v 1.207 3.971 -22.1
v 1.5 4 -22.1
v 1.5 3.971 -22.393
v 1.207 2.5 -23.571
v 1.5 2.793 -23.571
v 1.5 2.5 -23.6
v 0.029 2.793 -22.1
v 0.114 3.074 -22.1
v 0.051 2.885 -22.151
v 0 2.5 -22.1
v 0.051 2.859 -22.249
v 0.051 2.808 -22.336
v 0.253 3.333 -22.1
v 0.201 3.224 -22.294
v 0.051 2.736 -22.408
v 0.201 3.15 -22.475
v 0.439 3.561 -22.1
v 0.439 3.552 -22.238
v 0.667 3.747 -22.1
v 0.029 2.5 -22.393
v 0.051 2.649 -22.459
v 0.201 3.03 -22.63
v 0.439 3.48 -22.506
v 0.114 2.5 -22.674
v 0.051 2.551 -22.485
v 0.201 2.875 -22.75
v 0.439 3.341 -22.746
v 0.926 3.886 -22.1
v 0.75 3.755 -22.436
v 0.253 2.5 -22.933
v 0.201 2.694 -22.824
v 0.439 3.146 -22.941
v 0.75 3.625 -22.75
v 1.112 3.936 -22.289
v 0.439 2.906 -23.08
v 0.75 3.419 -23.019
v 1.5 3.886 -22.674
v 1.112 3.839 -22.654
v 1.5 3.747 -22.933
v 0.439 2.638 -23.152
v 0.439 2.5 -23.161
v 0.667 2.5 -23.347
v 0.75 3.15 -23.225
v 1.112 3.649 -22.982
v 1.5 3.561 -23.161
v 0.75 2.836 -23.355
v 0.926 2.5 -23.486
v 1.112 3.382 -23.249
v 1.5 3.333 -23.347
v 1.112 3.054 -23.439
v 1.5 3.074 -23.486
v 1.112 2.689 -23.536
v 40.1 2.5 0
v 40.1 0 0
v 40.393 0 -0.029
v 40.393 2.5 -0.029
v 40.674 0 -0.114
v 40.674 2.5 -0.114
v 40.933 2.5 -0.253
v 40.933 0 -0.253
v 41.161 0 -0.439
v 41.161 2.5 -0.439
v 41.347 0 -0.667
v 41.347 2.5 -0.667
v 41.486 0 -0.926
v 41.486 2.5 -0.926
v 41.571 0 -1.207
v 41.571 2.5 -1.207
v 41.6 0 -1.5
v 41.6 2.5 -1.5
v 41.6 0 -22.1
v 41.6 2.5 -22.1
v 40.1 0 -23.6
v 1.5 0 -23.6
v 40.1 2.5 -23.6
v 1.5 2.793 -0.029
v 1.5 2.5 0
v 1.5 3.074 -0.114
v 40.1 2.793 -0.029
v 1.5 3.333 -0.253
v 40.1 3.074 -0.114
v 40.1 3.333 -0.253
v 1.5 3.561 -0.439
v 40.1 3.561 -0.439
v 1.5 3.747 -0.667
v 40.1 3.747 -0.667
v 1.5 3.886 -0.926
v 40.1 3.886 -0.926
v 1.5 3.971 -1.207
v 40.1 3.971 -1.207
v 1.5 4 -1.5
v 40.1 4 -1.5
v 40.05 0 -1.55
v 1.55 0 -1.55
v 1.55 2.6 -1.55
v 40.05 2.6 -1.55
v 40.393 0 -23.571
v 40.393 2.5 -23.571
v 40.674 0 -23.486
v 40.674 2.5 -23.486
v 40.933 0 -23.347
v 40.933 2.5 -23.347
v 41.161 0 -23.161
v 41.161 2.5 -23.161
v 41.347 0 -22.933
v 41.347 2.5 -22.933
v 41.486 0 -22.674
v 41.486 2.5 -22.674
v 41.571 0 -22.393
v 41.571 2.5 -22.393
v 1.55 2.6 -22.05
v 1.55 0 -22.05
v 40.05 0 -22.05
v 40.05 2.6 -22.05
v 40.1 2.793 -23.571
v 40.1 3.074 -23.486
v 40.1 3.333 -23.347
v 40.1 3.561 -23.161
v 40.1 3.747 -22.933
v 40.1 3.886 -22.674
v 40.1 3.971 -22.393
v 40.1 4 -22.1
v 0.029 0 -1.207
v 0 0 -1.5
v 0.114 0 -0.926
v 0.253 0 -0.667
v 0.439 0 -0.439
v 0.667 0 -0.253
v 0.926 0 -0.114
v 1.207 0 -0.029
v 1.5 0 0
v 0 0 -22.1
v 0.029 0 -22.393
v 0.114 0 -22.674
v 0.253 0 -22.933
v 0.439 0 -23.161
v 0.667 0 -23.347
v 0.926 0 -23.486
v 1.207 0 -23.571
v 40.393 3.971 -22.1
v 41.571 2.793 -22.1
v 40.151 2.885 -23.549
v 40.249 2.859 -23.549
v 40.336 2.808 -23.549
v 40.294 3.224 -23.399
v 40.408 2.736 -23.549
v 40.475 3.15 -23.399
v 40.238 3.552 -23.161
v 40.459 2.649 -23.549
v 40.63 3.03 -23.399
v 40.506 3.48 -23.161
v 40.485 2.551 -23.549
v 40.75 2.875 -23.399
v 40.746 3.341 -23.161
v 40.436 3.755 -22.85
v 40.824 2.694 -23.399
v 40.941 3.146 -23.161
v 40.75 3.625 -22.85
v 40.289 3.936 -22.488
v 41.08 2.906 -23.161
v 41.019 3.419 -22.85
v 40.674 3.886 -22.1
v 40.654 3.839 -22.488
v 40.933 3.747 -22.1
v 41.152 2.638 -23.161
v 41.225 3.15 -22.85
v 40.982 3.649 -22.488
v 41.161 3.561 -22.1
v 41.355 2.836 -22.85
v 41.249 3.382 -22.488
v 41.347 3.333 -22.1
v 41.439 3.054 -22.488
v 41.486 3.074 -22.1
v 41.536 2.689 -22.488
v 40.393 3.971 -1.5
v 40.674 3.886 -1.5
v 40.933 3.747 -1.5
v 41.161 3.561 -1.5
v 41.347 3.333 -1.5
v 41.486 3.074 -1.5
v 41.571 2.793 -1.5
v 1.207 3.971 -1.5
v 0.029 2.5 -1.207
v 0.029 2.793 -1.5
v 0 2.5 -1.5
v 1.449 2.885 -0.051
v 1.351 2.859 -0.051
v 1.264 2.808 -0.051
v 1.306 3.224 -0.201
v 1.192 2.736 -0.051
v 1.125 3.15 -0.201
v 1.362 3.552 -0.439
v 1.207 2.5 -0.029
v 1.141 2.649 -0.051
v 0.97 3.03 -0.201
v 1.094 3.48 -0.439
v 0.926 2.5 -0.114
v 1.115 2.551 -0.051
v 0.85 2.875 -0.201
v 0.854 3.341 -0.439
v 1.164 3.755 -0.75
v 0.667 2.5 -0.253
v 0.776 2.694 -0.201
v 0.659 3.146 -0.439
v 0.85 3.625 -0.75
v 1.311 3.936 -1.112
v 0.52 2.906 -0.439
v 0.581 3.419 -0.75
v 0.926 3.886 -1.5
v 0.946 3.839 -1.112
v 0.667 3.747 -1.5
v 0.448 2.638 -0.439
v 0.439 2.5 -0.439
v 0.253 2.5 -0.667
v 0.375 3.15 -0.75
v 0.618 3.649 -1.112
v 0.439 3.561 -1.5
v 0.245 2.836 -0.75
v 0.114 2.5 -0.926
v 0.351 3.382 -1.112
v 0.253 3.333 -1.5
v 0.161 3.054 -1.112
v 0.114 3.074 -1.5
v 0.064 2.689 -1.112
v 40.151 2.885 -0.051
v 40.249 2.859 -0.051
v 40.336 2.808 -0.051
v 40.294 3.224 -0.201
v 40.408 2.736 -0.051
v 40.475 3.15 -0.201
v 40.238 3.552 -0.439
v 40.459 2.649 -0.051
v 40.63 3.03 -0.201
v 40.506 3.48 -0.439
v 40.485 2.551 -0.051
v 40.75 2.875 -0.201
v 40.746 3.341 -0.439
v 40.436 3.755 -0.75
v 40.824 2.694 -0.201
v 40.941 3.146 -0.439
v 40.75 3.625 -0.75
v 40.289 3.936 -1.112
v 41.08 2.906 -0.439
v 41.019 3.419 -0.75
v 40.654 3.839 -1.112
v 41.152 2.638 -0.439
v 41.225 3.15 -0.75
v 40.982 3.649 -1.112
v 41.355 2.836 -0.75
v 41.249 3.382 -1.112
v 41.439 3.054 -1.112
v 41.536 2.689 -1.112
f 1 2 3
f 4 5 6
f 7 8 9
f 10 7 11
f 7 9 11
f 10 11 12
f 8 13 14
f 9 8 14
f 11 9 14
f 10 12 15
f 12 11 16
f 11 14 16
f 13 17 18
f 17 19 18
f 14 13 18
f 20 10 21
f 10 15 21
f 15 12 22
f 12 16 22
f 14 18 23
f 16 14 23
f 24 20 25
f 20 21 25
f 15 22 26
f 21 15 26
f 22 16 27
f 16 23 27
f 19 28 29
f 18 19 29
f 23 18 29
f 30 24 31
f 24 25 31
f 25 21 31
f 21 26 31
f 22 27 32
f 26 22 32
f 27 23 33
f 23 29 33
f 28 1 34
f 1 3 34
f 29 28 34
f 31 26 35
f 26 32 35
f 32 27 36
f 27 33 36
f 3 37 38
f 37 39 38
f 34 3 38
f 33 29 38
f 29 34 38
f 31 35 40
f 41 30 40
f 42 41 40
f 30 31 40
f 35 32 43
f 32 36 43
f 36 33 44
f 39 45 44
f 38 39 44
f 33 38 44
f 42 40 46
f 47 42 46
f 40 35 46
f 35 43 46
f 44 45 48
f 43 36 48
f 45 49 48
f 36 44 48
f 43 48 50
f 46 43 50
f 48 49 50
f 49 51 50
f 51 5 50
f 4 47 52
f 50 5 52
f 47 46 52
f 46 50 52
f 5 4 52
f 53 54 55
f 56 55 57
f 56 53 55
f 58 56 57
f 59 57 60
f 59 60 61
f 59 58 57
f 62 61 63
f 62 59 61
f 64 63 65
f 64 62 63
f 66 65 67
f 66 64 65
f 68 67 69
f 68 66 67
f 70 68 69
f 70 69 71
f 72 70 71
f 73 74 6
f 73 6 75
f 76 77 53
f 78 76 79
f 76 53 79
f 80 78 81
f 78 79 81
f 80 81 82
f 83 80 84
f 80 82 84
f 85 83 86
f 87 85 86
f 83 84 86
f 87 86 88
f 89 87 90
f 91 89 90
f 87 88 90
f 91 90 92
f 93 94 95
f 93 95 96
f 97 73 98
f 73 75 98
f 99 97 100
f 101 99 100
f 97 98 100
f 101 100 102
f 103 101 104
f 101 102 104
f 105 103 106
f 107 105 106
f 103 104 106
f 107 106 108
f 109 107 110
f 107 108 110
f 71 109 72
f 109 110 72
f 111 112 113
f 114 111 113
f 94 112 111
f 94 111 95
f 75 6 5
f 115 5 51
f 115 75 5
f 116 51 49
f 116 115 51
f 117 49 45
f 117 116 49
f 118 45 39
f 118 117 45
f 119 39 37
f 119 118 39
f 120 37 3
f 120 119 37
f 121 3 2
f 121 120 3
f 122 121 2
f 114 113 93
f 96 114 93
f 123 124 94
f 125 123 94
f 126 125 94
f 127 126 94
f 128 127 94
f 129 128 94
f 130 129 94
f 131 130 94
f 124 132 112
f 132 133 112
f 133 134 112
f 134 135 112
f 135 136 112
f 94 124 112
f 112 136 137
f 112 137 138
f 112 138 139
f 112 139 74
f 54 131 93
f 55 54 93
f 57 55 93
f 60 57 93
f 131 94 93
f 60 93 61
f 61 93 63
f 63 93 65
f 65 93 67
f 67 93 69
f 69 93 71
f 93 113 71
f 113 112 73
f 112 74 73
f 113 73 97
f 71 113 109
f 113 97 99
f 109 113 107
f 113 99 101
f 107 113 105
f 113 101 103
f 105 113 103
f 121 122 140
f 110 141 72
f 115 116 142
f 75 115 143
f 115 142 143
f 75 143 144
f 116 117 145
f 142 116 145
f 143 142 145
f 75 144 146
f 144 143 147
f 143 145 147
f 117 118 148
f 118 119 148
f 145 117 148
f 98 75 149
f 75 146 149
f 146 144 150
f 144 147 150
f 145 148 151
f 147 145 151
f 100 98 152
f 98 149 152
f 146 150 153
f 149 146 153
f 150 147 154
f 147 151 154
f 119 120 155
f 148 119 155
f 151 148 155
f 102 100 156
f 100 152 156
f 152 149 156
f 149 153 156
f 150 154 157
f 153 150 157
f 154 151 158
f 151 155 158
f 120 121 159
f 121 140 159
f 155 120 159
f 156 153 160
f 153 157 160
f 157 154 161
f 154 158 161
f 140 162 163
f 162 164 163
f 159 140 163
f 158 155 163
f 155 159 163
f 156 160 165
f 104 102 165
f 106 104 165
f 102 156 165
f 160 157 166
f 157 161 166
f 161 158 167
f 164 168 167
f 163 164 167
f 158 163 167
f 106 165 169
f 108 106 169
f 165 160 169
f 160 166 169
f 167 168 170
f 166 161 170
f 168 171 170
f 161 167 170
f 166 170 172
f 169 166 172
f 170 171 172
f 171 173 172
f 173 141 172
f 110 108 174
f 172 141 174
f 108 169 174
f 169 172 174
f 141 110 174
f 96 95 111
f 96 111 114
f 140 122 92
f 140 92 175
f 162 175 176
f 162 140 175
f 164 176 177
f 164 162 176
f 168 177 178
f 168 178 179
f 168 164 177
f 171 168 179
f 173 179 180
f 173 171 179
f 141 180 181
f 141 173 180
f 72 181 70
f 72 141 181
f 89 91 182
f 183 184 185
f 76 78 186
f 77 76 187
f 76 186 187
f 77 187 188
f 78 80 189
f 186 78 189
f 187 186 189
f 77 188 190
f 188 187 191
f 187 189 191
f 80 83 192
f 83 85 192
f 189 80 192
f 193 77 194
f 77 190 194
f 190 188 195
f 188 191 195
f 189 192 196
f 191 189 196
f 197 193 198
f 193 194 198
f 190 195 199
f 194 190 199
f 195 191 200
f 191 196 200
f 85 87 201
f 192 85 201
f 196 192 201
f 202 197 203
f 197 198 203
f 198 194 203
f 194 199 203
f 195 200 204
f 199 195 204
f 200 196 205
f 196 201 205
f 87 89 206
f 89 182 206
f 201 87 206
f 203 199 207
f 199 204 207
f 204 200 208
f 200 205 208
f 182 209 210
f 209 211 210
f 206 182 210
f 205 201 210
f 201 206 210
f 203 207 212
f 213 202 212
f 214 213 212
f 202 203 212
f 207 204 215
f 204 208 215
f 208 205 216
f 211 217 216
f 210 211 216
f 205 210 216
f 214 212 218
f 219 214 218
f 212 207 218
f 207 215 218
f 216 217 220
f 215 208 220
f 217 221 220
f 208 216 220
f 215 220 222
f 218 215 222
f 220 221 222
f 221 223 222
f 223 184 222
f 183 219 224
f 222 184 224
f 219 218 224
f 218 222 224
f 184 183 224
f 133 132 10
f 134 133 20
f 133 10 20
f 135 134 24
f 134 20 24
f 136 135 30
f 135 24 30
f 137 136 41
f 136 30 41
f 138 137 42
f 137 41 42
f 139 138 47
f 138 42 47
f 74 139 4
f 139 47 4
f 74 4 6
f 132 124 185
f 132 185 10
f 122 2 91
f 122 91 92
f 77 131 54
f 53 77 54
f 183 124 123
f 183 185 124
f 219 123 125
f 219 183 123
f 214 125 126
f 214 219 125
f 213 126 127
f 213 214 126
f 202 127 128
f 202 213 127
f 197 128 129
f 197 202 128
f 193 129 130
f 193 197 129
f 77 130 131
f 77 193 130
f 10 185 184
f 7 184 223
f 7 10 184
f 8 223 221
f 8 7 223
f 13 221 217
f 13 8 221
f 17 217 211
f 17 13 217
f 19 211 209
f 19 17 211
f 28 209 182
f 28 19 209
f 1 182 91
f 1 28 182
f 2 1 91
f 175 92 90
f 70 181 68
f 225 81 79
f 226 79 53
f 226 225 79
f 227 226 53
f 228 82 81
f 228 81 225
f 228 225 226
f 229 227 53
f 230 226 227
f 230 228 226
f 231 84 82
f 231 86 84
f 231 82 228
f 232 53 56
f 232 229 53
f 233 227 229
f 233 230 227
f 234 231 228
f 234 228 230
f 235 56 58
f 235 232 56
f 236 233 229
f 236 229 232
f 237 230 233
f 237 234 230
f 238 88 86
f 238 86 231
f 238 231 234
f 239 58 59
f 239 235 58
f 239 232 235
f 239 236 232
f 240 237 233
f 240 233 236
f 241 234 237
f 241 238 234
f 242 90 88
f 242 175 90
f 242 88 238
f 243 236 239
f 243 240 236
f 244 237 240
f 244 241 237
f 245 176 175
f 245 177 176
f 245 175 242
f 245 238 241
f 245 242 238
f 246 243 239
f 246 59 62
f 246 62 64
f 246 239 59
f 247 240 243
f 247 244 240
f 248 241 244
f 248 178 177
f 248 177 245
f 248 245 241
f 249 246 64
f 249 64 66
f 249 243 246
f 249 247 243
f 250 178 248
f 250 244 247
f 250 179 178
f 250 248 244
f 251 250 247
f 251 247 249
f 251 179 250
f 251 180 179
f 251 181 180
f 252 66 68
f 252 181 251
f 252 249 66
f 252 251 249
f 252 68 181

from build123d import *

# Parameters (mm, degrees)
SKETCH1_W           = 41.6
SKETCH1_H           = 23.6
BOSS_EXTRUDE1_DEPTH = 4
SKETCH2_W           = 38.5
SKETCH2_H           = 20.5
CUT_EXTRUDE1_DEPTH  = 2.6
FILLET1_R           = 1.5


with BuildPart() as part:
    # Sketch1 → Boss-Extrude1 (new body)
    with BuildSketch(Plane(origin=(0, 0, 0), x_dir=(1, 0, 0), z_dir=(0, 1, 0))):
        with Locations((20.8, 11.8)):
            Rectangle(SKETCH1_W, SKETCH1_H)
    extrude(amount=BOSS_EXTRUDE1_DEPTH)

    # Sketch2 → Cut-Extrude1 (cut)
    with BuildSketch(Plane.XZ):
        with Locations((20.8, -11.8)):
            Rectangle(SKETCH2_W, SKETCH2_H)
    extrude(amount=-CUT_EXTRUDE1_DEPTH, mode=Mode.SUBTRACT)

    # Fillet1
    fillet1_edges = [part.edges().sort_by_distance(p)[0] for p in [
        (41.6, 4, -11.8),
        (20.8, 4, -23.6),
        (0, 4, -11.8),
        (20.8, 4, 0),
        (0, 2, -23.6),
        (41.6, 2, -23.6),
        (41.6, 2, 0),
        (0, 2, 0),
    ]]
    fillet(fillet1_edges, radius=FILLET1_R)


solid = part.part
